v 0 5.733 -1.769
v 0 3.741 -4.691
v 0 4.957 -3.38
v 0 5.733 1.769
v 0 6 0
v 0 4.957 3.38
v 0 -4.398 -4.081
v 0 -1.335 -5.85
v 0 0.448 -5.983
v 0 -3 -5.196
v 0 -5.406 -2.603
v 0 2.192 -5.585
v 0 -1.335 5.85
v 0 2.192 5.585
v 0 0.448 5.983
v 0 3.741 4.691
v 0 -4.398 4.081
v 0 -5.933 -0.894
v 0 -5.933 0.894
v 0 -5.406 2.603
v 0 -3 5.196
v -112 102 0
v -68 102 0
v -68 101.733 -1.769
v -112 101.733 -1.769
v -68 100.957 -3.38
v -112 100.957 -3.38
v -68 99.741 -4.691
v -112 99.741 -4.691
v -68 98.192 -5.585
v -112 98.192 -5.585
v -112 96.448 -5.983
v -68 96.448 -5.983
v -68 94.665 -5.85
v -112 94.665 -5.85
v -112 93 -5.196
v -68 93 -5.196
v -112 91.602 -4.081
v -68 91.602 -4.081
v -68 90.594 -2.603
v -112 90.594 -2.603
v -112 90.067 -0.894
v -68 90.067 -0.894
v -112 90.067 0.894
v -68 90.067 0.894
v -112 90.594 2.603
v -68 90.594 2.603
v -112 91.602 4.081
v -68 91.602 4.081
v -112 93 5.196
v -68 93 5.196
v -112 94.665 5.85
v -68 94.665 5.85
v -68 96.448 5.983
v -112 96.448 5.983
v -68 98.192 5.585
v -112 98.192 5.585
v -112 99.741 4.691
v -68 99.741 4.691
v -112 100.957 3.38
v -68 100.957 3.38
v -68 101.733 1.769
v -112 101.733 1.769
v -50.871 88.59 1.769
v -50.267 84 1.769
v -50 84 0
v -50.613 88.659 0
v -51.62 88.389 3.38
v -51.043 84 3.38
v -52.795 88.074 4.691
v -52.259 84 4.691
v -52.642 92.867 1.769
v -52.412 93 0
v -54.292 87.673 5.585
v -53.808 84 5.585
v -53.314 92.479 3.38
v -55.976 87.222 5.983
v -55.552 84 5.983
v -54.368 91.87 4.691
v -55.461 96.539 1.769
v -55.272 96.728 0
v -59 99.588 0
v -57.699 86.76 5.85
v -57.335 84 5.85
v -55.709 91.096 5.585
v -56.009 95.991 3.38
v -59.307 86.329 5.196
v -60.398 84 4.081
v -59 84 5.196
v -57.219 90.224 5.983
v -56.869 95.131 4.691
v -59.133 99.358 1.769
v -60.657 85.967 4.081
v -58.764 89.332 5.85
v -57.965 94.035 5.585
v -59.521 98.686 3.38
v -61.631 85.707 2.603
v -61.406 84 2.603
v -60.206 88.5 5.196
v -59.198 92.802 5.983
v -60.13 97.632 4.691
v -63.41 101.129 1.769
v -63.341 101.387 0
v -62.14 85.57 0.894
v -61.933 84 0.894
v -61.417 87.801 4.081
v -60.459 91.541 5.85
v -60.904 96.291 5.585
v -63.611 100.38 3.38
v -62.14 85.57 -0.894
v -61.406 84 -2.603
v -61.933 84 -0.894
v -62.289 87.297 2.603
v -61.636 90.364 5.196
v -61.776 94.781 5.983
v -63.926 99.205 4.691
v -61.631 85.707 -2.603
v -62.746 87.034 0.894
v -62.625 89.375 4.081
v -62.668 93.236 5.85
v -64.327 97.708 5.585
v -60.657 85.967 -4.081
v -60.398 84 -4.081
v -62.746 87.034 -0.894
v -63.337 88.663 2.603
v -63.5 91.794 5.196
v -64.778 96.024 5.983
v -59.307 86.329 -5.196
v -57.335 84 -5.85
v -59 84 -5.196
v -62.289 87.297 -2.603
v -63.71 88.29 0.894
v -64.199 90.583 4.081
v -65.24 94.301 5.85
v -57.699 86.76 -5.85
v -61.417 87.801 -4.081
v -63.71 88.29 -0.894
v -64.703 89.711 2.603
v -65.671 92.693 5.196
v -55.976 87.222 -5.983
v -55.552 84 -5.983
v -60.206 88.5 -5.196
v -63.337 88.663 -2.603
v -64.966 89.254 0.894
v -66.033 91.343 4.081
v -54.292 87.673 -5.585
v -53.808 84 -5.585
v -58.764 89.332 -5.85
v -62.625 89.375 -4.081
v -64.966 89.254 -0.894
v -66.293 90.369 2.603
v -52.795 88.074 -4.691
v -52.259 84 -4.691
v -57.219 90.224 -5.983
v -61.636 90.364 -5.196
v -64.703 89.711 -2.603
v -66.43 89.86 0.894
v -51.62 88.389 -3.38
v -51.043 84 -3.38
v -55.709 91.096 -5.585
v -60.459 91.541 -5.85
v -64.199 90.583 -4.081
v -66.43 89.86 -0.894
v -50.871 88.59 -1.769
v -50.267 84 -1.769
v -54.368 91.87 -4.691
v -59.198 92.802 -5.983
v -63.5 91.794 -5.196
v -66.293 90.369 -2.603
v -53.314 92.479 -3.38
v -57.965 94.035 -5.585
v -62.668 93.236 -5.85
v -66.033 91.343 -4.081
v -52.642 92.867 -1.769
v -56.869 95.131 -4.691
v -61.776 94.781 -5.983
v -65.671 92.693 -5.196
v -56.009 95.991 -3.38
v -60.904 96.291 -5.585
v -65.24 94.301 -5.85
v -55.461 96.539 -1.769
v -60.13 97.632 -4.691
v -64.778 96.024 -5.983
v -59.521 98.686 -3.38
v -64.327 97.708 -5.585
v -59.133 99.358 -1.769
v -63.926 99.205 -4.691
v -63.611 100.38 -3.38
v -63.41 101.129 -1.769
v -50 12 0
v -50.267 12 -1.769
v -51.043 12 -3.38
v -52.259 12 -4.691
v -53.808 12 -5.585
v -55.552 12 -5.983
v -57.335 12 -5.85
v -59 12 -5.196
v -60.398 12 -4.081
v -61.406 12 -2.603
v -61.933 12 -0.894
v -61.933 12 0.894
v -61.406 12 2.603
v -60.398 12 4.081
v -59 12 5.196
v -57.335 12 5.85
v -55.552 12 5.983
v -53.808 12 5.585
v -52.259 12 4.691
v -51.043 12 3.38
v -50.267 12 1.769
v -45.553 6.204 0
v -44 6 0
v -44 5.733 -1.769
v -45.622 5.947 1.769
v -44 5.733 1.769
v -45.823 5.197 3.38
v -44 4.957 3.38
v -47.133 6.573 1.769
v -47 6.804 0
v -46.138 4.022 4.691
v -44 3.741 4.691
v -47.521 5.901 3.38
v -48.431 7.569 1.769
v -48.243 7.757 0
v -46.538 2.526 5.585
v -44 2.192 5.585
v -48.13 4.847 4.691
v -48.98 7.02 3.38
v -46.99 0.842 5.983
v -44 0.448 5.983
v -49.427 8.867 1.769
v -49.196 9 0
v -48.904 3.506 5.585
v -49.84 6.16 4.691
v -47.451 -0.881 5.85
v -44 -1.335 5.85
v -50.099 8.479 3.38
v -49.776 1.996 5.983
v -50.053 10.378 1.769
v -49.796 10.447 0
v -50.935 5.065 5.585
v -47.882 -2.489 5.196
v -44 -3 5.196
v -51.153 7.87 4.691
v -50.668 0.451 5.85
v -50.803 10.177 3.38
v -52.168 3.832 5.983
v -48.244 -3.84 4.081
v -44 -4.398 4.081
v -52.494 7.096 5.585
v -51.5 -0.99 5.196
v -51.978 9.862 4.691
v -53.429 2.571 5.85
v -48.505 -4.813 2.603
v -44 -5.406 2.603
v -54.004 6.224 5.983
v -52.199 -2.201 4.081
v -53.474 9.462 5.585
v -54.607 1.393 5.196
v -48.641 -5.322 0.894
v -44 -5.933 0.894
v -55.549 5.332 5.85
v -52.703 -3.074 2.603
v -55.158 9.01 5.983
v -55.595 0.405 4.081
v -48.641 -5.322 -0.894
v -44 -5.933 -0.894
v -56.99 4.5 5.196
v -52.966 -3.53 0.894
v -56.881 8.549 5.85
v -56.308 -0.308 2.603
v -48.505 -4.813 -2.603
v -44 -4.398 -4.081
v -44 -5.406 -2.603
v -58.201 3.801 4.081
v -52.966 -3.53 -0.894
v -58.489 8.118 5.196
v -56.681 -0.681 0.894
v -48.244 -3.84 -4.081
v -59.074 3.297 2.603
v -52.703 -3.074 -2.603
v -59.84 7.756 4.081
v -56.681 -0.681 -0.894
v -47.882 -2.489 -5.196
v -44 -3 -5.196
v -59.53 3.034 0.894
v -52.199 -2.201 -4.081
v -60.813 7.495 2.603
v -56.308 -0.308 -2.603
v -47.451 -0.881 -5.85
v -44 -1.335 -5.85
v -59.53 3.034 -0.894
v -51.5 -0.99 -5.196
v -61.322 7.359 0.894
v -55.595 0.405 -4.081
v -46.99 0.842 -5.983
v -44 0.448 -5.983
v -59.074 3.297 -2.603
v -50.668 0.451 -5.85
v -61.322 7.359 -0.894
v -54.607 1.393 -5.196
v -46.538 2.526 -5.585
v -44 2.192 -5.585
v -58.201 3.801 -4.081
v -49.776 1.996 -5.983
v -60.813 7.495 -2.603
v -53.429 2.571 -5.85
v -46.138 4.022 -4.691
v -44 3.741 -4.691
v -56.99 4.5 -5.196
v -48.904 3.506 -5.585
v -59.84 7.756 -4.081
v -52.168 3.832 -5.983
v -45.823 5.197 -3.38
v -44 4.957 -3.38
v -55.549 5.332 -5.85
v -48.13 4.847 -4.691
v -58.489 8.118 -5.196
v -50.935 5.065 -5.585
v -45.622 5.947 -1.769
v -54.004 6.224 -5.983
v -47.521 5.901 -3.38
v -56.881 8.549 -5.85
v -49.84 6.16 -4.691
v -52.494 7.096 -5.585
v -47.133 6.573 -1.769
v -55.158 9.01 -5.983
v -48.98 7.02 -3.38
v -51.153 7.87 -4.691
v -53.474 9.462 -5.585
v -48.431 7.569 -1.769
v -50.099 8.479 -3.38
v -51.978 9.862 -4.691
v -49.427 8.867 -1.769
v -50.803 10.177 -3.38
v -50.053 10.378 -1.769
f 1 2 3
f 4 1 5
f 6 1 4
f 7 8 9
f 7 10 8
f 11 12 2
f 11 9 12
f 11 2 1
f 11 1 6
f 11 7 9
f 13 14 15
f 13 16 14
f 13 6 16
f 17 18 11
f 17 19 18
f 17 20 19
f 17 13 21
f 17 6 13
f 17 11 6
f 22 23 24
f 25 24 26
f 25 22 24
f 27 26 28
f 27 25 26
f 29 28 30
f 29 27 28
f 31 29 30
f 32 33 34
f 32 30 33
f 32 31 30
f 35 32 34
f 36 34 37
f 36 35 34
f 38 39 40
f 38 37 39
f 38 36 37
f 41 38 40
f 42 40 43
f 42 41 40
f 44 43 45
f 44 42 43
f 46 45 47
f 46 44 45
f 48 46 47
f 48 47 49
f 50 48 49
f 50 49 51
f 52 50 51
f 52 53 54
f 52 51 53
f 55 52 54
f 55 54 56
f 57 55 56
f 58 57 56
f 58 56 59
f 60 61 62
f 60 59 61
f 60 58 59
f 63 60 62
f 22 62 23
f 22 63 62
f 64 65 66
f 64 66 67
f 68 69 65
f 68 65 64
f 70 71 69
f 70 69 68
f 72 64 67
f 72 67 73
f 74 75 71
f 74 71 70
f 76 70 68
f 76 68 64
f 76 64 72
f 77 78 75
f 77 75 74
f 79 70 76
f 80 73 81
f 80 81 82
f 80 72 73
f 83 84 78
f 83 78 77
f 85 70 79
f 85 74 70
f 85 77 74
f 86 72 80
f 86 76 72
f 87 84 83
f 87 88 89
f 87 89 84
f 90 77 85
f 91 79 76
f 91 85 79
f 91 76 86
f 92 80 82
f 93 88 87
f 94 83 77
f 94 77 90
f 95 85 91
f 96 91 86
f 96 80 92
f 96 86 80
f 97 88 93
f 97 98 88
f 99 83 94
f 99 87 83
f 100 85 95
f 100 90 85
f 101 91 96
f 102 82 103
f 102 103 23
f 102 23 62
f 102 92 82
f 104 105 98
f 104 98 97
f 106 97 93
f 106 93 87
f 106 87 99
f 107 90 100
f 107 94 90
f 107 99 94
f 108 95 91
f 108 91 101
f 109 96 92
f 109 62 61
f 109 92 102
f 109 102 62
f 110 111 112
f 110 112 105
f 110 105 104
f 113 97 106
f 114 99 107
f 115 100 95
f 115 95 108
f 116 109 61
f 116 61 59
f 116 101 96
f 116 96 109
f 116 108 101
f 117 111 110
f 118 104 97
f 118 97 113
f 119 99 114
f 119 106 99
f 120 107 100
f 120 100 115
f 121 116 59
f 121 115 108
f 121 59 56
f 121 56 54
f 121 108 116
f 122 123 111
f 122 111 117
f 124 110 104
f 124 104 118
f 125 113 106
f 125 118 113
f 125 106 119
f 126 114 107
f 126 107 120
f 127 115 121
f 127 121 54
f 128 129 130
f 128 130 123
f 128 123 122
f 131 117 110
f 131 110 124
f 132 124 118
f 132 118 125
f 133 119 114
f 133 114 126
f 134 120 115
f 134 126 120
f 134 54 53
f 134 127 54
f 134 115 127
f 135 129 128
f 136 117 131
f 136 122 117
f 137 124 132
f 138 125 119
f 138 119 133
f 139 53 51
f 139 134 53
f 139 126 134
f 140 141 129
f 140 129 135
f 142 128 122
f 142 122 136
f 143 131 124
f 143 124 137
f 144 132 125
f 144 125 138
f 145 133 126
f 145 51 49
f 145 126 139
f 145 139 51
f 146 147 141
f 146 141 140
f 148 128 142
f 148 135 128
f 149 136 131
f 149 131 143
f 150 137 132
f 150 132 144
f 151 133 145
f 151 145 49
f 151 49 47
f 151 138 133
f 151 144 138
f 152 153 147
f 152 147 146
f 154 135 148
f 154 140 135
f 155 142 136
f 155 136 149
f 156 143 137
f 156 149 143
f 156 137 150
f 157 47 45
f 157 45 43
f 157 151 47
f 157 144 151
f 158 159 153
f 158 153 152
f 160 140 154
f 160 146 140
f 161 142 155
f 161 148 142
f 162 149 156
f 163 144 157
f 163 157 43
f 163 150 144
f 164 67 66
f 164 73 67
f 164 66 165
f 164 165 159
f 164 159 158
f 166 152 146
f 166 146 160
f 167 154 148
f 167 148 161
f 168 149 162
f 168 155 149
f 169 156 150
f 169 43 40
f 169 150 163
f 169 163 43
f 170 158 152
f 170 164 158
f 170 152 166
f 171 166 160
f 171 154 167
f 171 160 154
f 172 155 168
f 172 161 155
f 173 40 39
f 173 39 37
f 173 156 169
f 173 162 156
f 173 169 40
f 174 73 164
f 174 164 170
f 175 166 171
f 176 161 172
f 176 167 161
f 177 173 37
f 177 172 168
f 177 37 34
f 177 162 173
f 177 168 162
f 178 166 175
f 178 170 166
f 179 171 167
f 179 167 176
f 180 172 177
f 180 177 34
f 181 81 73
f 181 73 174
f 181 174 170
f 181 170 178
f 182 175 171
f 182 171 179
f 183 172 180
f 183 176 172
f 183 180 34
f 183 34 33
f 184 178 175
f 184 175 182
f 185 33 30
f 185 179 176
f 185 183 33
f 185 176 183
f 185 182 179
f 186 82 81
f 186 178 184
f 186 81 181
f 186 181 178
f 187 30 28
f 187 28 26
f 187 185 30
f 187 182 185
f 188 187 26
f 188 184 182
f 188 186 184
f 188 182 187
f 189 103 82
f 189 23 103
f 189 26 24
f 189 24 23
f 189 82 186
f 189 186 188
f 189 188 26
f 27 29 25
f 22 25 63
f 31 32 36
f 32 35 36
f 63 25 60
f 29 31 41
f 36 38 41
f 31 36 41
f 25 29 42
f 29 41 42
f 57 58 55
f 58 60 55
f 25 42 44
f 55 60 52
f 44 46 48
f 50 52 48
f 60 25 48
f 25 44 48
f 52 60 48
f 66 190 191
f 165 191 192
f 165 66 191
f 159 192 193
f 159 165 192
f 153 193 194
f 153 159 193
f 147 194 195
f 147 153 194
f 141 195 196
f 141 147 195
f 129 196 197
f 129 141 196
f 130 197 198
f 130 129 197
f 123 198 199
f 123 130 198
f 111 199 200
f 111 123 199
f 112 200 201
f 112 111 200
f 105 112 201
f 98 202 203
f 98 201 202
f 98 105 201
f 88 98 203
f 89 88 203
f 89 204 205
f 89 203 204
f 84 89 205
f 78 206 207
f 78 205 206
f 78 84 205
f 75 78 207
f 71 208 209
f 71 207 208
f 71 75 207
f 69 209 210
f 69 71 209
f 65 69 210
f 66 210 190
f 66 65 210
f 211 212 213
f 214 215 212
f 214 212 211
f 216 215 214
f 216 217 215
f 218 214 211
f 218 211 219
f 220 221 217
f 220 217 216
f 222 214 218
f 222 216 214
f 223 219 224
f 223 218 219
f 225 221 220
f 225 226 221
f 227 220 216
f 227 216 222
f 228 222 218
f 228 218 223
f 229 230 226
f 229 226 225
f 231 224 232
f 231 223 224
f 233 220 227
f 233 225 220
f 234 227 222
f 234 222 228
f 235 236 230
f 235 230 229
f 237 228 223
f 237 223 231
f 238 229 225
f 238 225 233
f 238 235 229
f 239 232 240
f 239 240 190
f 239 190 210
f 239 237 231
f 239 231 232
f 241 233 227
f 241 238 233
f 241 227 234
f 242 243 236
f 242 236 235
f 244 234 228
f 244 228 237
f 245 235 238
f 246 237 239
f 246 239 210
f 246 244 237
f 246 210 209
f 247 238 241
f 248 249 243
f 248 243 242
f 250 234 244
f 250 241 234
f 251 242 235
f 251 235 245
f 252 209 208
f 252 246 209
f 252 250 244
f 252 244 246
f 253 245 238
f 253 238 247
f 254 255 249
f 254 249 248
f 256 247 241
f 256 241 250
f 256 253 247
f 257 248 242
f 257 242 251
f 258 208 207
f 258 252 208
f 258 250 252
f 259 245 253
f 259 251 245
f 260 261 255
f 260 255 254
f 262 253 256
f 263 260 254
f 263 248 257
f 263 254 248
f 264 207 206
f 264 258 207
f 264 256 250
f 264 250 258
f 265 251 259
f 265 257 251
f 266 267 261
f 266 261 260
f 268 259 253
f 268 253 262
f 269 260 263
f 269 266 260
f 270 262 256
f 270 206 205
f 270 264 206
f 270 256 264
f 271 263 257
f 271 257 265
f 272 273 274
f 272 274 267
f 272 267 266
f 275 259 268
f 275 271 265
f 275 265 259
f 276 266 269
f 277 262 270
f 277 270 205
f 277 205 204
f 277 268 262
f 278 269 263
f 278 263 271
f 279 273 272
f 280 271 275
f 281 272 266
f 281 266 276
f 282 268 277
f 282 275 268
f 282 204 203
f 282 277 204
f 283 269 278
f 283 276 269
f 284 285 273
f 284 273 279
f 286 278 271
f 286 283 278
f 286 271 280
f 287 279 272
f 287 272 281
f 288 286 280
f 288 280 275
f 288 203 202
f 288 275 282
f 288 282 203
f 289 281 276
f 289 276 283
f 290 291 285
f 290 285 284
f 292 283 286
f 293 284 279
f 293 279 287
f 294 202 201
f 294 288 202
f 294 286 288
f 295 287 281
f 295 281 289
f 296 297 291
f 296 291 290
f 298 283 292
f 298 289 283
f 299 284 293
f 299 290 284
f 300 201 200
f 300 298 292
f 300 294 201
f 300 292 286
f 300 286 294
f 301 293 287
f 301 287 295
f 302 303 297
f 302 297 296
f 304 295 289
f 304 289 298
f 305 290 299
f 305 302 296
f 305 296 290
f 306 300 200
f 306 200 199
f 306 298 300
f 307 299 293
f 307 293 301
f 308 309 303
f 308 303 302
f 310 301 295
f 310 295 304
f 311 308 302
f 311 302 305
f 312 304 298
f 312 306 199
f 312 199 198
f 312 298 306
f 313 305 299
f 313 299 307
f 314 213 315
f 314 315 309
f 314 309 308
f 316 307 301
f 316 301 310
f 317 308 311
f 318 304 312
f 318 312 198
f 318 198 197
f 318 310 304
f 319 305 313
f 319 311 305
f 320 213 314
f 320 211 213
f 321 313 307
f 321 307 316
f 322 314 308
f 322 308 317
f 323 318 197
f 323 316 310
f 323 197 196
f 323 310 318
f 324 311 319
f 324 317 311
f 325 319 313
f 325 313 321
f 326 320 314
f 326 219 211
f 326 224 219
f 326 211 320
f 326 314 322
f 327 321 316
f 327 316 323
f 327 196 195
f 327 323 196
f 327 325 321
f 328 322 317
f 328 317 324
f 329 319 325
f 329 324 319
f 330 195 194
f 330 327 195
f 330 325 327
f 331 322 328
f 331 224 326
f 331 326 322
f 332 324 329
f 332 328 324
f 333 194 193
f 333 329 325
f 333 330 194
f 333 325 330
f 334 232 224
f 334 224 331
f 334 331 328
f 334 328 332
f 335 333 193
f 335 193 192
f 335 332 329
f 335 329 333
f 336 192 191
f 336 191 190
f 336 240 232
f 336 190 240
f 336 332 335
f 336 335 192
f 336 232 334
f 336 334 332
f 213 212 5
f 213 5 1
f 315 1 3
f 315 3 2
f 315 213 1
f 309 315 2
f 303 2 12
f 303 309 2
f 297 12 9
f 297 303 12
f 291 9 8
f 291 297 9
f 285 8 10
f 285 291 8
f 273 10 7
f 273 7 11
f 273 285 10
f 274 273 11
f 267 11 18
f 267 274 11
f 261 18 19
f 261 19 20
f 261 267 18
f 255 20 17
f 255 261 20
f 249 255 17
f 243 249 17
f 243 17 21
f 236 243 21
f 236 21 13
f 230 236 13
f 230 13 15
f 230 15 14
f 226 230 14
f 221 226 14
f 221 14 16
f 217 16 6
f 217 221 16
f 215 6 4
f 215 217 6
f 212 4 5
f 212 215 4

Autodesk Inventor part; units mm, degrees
ref_plane "YZ Plane" through (0, 0, 0) normal (1, 0, 0) x (0, 1, 0)
ref_plane "XZ Plane" through (0, 0, 0) normal (0, 1, 0) x (-1, 0, 0)
ref_plane "XY Plane" through (0, 0, 0) normal (0, 0, 1) x (1, 0, 0)
sketch "Sketch2" plane through (0, 0, 0) normal (0, 0, 1) x (1, 0, 0)
  line L0 (0, 0) -> (-44, 0)
  line L1 (-56, 12) -> (-56, 84)
  line L2 (-68, 96) -> (-112, 96)
  arc A0 (-56, 84) -> (-68, 96) centre (-68, 84) ccw
  arc A1 (-56, 12) -> (-44, 0) centre (-44, 12) ccw
  point P0 (-56, 0)
  point P1 (-56, 96)
  dimension "d0" = 56
  dimension "d1" = 96
  dimension "d2" = 56
  dimension "d3" = 12
sketch "Sketch3" plane through (0, 0, 0) normal (1, 0, 0) x (0, 1, 0)
  circle A0 centre (0, 0) radius 6
  dimension "d4" = 12
sweep "Sweep1" add profiles "Sketch3" path "Sketch2"
properties part number "handle"
